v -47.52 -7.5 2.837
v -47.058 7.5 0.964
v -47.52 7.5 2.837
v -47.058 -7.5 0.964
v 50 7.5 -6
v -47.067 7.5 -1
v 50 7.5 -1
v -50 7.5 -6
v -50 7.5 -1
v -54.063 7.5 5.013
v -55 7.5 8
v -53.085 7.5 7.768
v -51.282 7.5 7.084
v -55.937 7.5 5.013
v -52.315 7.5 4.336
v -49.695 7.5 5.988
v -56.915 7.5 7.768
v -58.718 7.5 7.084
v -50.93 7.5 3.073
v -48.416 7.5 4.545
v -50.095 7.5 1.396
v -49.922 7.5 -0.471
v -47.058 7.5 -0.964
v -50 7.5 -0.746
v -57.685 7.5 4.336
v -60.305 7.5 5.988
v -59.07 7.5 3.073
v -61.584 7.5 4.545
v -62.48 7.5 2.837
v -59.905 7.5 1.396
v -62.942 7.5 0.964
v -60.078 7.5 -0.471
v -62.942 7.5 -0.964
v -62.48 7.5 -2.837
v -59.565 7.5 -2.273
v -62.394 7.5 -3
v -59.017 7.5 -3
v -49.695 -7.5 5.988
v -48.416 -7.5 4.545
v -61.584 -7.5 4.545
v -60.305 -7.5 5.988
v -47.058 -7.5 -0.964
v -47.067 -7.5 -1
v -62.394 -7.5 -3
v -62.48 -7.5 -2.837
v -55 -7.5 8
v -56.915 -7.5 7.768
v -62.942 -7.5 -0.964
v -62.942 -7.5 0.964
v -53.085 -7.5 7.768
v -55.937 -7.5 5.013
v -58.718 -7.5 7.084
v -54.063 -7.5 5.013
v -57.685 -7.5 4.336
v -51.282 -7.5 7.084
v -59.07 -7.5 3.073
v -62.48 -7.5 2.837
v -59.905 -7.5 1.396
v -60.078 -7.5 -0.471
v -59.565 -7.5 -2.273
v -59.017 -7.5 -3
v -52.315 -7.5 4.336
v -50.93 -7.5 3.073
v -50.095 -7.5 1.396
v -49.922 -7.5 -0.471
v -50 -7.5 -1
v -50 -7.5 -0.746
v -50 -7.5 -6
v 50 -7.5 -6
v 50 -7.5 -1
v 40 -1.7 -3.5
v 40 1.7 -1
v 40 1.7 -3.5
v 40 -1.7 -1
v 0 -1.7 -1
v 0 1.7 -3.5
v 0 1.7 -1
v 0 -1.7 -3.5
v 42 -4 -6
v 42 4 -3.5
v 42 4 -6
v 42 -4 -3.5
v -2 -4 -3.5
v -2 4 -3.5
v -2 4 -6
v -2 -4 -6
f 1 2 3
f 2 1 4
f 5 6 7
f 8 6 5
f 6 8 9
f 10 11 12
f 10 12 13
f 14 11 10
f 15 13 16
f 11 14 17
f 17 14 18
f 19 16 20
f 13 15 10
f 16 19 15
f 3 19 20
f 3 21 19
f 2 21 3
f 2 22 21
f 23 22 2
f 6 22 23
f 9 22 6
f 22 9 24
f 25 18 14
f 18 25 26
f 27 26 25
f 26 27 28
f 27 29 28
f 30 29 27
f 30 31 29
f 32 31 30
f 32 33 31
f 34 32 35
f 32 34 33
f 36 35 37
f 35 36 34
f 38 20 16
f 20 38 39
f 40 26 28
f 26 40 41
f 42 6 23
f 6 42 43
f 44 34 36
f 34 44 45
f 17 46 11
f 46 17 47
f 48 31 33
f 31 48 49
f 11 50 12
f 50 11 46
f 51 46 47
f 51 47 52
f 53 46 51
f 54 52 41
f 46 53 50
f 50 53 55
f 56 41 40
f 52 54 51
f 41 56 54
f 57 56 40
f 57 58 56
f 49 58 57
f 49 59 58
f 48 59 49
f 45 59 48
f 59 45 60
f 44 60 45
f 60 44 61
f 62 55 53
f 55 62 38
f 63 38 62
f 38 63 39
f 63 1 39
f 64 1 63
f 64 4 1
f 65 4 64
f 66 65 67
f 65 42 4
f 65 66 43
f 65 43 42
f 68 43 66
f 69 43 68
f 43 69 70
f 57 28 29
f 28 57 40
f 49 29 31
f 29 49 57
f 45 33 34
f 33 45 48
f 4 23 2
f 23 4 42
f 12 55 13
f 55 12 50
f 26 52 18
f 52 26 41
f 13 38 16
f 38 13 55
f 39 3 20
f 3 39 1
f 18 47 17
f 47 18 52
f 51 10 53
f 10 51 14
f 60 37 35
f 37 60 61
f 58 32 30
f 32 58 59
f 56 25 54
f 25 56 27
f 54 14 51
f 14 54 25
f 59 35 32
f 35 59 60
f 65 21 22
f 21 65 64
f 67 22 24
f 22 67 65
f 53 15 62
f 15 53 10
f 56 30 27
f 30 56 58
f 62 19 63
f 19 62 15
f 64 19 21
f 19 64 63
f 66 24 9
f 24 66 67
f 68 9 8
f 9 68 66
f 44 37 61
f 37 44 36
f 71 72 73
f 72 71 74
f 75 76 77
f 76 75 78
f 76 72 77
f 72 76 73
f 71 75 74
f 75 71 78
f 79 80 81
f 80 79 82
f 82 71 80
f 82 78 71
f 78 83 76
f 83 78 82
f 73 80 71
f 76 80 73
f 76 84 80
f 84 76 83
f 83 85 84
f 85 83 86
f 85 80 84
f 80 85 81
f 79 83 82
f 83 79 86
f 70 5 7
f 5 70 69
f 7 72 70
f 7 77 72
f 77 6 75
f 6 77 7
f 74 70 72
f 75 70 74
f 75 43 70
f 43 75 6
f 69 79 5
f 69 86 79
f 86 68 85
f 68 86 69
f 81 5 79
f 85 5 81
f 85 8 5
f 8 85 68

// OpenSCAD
ch = 15;
cl = 100;

module nut2(){
    union(){
        cylinder(35, 1.7, 1.7, $fn=30);
        translate([0,0,5])cylinder(3, 4, 4, $fn=6);
        //translate([-2.2,-3.20,5])cube([10,6.4,3]);
        translate([0,0,30])cylinder(3, 3.7, 3.7, $fn=20);
    }
}


module clamp(){
    difference(){
        cylinder(r=8, h=ch, center=true);
        cylinder(r=5.1, h=ch*2, center=true);
        translate([5,-0.5,0])cube([10,9,20], center=true);
        translate([13,0,0])cube([20,20,20], center=true);
    }
    
}

module bar(){
    translate([-(cl/2)-5,0,0])rotate([0,90,90])clamp();
    translate([0,0,-3.5])difference(){
        cube([cl,ch,5], center=true);
        union(){
            translate([20,0,-2])cube([40,3.4,10], center=true);
            translate([20,0,-5])cube([44,8,10], center=true);
        }
    }
    
}



module balls(){
    
    bd = 8;
    r1 = 20;
    r2 = 40;
    r3 = 60;
    
    union(){
        translate([0,0,bd])sphere(r=7, center=true, $fn=70);
        for (a = [0:3]) {
            // row 1
            rotate([0,0,a*120-90])translate([r1,-8,bd])sphere(r=7, center=true, $fn=70);
            rotate([0,0,a*120-90])translate([r1,8,bd])sphere(r=7, center=true, $fn=70);
            // row 2
            rotate([0,0,a*120-90])translate([r2,-17,bd])sphere(r=7, center=true, $fn=70);
            rotate([0,0,a*120-90])translate([r2,0,bd])sphere(r=7, center=true, $fn=70);
            rotate([0,0,a*120-90])translate([r2,17,bd])sphere(r=7, center=true, $fn=70);
            
        }
        /*for (a = [0:3]) {
            // row 2
            rotate([0,0,a*120-30])translate([r2,-8,bd])sphere(r=7, center=true, $fn=70);
            rotate([0,0,a*120-30])translate([r2,8,bd])sphere(r=7, center=true, $fn=70);
        }*/
        for (a = [0:6]) {
            // row 3
            rotate([0,0,a*60-90])translate([r3,-17,bd])sphere(r=7, center=true, $fn=70);
            rotate([0,0,a*60-90])translate([r3,0,bd])sphere(r=7, center=true, $fn=70);
            rotate([0,0,a*60-90])translate([r3,17,bd])sphere(r=7, center=true, $fn=70);
        }
    }
    
}


module platform(){
    
    difference(){
        translate([0,0,-1])cube([400,400,10], center=true);
        union(){
            for (a = [0:6]) {
                rotate([0,0,a*60])translate([0,180,0])cube([300,200,40], center=true);
            }
        }
        for (a = [0:2]) {
            rotate([0,0,(a*120)-90])translate([-(80)-5,20,-3.5])cube([cl+1,ch+1,6], center=true);
            rotate([0,0,(a*120)-90])translate([-(80)-5,-20,-3.5])cube([cl+1,ch+1,6], center=true);
            rotate([180,0,(a*120)-90])translate([-(70)-5,20,-9.5])nut2();
            rotate([180,0,(a*120)-90])translate([-(70)-5,-20,-9.5])nut2();
        }
        balls();
    }
    
}

module base(){

    platform();
    
    // Threaded rods
    for (a = [0:2]) {
        rotate(a*120) translate([0, 160, 0])rotate([0,90,0])cylinder(r=5, h=500, center=true);
    }
    // Clamp bars
    for (a = [0:2]) {
        rotate([0,0,(a*120)-90])translate([-(100)-5,20,0])bar();
        rotate([0,0,(a*120)-90])translate([-(100)-5,-20,0])bar();
    }
    
}

//base();
bar();
//platform();
